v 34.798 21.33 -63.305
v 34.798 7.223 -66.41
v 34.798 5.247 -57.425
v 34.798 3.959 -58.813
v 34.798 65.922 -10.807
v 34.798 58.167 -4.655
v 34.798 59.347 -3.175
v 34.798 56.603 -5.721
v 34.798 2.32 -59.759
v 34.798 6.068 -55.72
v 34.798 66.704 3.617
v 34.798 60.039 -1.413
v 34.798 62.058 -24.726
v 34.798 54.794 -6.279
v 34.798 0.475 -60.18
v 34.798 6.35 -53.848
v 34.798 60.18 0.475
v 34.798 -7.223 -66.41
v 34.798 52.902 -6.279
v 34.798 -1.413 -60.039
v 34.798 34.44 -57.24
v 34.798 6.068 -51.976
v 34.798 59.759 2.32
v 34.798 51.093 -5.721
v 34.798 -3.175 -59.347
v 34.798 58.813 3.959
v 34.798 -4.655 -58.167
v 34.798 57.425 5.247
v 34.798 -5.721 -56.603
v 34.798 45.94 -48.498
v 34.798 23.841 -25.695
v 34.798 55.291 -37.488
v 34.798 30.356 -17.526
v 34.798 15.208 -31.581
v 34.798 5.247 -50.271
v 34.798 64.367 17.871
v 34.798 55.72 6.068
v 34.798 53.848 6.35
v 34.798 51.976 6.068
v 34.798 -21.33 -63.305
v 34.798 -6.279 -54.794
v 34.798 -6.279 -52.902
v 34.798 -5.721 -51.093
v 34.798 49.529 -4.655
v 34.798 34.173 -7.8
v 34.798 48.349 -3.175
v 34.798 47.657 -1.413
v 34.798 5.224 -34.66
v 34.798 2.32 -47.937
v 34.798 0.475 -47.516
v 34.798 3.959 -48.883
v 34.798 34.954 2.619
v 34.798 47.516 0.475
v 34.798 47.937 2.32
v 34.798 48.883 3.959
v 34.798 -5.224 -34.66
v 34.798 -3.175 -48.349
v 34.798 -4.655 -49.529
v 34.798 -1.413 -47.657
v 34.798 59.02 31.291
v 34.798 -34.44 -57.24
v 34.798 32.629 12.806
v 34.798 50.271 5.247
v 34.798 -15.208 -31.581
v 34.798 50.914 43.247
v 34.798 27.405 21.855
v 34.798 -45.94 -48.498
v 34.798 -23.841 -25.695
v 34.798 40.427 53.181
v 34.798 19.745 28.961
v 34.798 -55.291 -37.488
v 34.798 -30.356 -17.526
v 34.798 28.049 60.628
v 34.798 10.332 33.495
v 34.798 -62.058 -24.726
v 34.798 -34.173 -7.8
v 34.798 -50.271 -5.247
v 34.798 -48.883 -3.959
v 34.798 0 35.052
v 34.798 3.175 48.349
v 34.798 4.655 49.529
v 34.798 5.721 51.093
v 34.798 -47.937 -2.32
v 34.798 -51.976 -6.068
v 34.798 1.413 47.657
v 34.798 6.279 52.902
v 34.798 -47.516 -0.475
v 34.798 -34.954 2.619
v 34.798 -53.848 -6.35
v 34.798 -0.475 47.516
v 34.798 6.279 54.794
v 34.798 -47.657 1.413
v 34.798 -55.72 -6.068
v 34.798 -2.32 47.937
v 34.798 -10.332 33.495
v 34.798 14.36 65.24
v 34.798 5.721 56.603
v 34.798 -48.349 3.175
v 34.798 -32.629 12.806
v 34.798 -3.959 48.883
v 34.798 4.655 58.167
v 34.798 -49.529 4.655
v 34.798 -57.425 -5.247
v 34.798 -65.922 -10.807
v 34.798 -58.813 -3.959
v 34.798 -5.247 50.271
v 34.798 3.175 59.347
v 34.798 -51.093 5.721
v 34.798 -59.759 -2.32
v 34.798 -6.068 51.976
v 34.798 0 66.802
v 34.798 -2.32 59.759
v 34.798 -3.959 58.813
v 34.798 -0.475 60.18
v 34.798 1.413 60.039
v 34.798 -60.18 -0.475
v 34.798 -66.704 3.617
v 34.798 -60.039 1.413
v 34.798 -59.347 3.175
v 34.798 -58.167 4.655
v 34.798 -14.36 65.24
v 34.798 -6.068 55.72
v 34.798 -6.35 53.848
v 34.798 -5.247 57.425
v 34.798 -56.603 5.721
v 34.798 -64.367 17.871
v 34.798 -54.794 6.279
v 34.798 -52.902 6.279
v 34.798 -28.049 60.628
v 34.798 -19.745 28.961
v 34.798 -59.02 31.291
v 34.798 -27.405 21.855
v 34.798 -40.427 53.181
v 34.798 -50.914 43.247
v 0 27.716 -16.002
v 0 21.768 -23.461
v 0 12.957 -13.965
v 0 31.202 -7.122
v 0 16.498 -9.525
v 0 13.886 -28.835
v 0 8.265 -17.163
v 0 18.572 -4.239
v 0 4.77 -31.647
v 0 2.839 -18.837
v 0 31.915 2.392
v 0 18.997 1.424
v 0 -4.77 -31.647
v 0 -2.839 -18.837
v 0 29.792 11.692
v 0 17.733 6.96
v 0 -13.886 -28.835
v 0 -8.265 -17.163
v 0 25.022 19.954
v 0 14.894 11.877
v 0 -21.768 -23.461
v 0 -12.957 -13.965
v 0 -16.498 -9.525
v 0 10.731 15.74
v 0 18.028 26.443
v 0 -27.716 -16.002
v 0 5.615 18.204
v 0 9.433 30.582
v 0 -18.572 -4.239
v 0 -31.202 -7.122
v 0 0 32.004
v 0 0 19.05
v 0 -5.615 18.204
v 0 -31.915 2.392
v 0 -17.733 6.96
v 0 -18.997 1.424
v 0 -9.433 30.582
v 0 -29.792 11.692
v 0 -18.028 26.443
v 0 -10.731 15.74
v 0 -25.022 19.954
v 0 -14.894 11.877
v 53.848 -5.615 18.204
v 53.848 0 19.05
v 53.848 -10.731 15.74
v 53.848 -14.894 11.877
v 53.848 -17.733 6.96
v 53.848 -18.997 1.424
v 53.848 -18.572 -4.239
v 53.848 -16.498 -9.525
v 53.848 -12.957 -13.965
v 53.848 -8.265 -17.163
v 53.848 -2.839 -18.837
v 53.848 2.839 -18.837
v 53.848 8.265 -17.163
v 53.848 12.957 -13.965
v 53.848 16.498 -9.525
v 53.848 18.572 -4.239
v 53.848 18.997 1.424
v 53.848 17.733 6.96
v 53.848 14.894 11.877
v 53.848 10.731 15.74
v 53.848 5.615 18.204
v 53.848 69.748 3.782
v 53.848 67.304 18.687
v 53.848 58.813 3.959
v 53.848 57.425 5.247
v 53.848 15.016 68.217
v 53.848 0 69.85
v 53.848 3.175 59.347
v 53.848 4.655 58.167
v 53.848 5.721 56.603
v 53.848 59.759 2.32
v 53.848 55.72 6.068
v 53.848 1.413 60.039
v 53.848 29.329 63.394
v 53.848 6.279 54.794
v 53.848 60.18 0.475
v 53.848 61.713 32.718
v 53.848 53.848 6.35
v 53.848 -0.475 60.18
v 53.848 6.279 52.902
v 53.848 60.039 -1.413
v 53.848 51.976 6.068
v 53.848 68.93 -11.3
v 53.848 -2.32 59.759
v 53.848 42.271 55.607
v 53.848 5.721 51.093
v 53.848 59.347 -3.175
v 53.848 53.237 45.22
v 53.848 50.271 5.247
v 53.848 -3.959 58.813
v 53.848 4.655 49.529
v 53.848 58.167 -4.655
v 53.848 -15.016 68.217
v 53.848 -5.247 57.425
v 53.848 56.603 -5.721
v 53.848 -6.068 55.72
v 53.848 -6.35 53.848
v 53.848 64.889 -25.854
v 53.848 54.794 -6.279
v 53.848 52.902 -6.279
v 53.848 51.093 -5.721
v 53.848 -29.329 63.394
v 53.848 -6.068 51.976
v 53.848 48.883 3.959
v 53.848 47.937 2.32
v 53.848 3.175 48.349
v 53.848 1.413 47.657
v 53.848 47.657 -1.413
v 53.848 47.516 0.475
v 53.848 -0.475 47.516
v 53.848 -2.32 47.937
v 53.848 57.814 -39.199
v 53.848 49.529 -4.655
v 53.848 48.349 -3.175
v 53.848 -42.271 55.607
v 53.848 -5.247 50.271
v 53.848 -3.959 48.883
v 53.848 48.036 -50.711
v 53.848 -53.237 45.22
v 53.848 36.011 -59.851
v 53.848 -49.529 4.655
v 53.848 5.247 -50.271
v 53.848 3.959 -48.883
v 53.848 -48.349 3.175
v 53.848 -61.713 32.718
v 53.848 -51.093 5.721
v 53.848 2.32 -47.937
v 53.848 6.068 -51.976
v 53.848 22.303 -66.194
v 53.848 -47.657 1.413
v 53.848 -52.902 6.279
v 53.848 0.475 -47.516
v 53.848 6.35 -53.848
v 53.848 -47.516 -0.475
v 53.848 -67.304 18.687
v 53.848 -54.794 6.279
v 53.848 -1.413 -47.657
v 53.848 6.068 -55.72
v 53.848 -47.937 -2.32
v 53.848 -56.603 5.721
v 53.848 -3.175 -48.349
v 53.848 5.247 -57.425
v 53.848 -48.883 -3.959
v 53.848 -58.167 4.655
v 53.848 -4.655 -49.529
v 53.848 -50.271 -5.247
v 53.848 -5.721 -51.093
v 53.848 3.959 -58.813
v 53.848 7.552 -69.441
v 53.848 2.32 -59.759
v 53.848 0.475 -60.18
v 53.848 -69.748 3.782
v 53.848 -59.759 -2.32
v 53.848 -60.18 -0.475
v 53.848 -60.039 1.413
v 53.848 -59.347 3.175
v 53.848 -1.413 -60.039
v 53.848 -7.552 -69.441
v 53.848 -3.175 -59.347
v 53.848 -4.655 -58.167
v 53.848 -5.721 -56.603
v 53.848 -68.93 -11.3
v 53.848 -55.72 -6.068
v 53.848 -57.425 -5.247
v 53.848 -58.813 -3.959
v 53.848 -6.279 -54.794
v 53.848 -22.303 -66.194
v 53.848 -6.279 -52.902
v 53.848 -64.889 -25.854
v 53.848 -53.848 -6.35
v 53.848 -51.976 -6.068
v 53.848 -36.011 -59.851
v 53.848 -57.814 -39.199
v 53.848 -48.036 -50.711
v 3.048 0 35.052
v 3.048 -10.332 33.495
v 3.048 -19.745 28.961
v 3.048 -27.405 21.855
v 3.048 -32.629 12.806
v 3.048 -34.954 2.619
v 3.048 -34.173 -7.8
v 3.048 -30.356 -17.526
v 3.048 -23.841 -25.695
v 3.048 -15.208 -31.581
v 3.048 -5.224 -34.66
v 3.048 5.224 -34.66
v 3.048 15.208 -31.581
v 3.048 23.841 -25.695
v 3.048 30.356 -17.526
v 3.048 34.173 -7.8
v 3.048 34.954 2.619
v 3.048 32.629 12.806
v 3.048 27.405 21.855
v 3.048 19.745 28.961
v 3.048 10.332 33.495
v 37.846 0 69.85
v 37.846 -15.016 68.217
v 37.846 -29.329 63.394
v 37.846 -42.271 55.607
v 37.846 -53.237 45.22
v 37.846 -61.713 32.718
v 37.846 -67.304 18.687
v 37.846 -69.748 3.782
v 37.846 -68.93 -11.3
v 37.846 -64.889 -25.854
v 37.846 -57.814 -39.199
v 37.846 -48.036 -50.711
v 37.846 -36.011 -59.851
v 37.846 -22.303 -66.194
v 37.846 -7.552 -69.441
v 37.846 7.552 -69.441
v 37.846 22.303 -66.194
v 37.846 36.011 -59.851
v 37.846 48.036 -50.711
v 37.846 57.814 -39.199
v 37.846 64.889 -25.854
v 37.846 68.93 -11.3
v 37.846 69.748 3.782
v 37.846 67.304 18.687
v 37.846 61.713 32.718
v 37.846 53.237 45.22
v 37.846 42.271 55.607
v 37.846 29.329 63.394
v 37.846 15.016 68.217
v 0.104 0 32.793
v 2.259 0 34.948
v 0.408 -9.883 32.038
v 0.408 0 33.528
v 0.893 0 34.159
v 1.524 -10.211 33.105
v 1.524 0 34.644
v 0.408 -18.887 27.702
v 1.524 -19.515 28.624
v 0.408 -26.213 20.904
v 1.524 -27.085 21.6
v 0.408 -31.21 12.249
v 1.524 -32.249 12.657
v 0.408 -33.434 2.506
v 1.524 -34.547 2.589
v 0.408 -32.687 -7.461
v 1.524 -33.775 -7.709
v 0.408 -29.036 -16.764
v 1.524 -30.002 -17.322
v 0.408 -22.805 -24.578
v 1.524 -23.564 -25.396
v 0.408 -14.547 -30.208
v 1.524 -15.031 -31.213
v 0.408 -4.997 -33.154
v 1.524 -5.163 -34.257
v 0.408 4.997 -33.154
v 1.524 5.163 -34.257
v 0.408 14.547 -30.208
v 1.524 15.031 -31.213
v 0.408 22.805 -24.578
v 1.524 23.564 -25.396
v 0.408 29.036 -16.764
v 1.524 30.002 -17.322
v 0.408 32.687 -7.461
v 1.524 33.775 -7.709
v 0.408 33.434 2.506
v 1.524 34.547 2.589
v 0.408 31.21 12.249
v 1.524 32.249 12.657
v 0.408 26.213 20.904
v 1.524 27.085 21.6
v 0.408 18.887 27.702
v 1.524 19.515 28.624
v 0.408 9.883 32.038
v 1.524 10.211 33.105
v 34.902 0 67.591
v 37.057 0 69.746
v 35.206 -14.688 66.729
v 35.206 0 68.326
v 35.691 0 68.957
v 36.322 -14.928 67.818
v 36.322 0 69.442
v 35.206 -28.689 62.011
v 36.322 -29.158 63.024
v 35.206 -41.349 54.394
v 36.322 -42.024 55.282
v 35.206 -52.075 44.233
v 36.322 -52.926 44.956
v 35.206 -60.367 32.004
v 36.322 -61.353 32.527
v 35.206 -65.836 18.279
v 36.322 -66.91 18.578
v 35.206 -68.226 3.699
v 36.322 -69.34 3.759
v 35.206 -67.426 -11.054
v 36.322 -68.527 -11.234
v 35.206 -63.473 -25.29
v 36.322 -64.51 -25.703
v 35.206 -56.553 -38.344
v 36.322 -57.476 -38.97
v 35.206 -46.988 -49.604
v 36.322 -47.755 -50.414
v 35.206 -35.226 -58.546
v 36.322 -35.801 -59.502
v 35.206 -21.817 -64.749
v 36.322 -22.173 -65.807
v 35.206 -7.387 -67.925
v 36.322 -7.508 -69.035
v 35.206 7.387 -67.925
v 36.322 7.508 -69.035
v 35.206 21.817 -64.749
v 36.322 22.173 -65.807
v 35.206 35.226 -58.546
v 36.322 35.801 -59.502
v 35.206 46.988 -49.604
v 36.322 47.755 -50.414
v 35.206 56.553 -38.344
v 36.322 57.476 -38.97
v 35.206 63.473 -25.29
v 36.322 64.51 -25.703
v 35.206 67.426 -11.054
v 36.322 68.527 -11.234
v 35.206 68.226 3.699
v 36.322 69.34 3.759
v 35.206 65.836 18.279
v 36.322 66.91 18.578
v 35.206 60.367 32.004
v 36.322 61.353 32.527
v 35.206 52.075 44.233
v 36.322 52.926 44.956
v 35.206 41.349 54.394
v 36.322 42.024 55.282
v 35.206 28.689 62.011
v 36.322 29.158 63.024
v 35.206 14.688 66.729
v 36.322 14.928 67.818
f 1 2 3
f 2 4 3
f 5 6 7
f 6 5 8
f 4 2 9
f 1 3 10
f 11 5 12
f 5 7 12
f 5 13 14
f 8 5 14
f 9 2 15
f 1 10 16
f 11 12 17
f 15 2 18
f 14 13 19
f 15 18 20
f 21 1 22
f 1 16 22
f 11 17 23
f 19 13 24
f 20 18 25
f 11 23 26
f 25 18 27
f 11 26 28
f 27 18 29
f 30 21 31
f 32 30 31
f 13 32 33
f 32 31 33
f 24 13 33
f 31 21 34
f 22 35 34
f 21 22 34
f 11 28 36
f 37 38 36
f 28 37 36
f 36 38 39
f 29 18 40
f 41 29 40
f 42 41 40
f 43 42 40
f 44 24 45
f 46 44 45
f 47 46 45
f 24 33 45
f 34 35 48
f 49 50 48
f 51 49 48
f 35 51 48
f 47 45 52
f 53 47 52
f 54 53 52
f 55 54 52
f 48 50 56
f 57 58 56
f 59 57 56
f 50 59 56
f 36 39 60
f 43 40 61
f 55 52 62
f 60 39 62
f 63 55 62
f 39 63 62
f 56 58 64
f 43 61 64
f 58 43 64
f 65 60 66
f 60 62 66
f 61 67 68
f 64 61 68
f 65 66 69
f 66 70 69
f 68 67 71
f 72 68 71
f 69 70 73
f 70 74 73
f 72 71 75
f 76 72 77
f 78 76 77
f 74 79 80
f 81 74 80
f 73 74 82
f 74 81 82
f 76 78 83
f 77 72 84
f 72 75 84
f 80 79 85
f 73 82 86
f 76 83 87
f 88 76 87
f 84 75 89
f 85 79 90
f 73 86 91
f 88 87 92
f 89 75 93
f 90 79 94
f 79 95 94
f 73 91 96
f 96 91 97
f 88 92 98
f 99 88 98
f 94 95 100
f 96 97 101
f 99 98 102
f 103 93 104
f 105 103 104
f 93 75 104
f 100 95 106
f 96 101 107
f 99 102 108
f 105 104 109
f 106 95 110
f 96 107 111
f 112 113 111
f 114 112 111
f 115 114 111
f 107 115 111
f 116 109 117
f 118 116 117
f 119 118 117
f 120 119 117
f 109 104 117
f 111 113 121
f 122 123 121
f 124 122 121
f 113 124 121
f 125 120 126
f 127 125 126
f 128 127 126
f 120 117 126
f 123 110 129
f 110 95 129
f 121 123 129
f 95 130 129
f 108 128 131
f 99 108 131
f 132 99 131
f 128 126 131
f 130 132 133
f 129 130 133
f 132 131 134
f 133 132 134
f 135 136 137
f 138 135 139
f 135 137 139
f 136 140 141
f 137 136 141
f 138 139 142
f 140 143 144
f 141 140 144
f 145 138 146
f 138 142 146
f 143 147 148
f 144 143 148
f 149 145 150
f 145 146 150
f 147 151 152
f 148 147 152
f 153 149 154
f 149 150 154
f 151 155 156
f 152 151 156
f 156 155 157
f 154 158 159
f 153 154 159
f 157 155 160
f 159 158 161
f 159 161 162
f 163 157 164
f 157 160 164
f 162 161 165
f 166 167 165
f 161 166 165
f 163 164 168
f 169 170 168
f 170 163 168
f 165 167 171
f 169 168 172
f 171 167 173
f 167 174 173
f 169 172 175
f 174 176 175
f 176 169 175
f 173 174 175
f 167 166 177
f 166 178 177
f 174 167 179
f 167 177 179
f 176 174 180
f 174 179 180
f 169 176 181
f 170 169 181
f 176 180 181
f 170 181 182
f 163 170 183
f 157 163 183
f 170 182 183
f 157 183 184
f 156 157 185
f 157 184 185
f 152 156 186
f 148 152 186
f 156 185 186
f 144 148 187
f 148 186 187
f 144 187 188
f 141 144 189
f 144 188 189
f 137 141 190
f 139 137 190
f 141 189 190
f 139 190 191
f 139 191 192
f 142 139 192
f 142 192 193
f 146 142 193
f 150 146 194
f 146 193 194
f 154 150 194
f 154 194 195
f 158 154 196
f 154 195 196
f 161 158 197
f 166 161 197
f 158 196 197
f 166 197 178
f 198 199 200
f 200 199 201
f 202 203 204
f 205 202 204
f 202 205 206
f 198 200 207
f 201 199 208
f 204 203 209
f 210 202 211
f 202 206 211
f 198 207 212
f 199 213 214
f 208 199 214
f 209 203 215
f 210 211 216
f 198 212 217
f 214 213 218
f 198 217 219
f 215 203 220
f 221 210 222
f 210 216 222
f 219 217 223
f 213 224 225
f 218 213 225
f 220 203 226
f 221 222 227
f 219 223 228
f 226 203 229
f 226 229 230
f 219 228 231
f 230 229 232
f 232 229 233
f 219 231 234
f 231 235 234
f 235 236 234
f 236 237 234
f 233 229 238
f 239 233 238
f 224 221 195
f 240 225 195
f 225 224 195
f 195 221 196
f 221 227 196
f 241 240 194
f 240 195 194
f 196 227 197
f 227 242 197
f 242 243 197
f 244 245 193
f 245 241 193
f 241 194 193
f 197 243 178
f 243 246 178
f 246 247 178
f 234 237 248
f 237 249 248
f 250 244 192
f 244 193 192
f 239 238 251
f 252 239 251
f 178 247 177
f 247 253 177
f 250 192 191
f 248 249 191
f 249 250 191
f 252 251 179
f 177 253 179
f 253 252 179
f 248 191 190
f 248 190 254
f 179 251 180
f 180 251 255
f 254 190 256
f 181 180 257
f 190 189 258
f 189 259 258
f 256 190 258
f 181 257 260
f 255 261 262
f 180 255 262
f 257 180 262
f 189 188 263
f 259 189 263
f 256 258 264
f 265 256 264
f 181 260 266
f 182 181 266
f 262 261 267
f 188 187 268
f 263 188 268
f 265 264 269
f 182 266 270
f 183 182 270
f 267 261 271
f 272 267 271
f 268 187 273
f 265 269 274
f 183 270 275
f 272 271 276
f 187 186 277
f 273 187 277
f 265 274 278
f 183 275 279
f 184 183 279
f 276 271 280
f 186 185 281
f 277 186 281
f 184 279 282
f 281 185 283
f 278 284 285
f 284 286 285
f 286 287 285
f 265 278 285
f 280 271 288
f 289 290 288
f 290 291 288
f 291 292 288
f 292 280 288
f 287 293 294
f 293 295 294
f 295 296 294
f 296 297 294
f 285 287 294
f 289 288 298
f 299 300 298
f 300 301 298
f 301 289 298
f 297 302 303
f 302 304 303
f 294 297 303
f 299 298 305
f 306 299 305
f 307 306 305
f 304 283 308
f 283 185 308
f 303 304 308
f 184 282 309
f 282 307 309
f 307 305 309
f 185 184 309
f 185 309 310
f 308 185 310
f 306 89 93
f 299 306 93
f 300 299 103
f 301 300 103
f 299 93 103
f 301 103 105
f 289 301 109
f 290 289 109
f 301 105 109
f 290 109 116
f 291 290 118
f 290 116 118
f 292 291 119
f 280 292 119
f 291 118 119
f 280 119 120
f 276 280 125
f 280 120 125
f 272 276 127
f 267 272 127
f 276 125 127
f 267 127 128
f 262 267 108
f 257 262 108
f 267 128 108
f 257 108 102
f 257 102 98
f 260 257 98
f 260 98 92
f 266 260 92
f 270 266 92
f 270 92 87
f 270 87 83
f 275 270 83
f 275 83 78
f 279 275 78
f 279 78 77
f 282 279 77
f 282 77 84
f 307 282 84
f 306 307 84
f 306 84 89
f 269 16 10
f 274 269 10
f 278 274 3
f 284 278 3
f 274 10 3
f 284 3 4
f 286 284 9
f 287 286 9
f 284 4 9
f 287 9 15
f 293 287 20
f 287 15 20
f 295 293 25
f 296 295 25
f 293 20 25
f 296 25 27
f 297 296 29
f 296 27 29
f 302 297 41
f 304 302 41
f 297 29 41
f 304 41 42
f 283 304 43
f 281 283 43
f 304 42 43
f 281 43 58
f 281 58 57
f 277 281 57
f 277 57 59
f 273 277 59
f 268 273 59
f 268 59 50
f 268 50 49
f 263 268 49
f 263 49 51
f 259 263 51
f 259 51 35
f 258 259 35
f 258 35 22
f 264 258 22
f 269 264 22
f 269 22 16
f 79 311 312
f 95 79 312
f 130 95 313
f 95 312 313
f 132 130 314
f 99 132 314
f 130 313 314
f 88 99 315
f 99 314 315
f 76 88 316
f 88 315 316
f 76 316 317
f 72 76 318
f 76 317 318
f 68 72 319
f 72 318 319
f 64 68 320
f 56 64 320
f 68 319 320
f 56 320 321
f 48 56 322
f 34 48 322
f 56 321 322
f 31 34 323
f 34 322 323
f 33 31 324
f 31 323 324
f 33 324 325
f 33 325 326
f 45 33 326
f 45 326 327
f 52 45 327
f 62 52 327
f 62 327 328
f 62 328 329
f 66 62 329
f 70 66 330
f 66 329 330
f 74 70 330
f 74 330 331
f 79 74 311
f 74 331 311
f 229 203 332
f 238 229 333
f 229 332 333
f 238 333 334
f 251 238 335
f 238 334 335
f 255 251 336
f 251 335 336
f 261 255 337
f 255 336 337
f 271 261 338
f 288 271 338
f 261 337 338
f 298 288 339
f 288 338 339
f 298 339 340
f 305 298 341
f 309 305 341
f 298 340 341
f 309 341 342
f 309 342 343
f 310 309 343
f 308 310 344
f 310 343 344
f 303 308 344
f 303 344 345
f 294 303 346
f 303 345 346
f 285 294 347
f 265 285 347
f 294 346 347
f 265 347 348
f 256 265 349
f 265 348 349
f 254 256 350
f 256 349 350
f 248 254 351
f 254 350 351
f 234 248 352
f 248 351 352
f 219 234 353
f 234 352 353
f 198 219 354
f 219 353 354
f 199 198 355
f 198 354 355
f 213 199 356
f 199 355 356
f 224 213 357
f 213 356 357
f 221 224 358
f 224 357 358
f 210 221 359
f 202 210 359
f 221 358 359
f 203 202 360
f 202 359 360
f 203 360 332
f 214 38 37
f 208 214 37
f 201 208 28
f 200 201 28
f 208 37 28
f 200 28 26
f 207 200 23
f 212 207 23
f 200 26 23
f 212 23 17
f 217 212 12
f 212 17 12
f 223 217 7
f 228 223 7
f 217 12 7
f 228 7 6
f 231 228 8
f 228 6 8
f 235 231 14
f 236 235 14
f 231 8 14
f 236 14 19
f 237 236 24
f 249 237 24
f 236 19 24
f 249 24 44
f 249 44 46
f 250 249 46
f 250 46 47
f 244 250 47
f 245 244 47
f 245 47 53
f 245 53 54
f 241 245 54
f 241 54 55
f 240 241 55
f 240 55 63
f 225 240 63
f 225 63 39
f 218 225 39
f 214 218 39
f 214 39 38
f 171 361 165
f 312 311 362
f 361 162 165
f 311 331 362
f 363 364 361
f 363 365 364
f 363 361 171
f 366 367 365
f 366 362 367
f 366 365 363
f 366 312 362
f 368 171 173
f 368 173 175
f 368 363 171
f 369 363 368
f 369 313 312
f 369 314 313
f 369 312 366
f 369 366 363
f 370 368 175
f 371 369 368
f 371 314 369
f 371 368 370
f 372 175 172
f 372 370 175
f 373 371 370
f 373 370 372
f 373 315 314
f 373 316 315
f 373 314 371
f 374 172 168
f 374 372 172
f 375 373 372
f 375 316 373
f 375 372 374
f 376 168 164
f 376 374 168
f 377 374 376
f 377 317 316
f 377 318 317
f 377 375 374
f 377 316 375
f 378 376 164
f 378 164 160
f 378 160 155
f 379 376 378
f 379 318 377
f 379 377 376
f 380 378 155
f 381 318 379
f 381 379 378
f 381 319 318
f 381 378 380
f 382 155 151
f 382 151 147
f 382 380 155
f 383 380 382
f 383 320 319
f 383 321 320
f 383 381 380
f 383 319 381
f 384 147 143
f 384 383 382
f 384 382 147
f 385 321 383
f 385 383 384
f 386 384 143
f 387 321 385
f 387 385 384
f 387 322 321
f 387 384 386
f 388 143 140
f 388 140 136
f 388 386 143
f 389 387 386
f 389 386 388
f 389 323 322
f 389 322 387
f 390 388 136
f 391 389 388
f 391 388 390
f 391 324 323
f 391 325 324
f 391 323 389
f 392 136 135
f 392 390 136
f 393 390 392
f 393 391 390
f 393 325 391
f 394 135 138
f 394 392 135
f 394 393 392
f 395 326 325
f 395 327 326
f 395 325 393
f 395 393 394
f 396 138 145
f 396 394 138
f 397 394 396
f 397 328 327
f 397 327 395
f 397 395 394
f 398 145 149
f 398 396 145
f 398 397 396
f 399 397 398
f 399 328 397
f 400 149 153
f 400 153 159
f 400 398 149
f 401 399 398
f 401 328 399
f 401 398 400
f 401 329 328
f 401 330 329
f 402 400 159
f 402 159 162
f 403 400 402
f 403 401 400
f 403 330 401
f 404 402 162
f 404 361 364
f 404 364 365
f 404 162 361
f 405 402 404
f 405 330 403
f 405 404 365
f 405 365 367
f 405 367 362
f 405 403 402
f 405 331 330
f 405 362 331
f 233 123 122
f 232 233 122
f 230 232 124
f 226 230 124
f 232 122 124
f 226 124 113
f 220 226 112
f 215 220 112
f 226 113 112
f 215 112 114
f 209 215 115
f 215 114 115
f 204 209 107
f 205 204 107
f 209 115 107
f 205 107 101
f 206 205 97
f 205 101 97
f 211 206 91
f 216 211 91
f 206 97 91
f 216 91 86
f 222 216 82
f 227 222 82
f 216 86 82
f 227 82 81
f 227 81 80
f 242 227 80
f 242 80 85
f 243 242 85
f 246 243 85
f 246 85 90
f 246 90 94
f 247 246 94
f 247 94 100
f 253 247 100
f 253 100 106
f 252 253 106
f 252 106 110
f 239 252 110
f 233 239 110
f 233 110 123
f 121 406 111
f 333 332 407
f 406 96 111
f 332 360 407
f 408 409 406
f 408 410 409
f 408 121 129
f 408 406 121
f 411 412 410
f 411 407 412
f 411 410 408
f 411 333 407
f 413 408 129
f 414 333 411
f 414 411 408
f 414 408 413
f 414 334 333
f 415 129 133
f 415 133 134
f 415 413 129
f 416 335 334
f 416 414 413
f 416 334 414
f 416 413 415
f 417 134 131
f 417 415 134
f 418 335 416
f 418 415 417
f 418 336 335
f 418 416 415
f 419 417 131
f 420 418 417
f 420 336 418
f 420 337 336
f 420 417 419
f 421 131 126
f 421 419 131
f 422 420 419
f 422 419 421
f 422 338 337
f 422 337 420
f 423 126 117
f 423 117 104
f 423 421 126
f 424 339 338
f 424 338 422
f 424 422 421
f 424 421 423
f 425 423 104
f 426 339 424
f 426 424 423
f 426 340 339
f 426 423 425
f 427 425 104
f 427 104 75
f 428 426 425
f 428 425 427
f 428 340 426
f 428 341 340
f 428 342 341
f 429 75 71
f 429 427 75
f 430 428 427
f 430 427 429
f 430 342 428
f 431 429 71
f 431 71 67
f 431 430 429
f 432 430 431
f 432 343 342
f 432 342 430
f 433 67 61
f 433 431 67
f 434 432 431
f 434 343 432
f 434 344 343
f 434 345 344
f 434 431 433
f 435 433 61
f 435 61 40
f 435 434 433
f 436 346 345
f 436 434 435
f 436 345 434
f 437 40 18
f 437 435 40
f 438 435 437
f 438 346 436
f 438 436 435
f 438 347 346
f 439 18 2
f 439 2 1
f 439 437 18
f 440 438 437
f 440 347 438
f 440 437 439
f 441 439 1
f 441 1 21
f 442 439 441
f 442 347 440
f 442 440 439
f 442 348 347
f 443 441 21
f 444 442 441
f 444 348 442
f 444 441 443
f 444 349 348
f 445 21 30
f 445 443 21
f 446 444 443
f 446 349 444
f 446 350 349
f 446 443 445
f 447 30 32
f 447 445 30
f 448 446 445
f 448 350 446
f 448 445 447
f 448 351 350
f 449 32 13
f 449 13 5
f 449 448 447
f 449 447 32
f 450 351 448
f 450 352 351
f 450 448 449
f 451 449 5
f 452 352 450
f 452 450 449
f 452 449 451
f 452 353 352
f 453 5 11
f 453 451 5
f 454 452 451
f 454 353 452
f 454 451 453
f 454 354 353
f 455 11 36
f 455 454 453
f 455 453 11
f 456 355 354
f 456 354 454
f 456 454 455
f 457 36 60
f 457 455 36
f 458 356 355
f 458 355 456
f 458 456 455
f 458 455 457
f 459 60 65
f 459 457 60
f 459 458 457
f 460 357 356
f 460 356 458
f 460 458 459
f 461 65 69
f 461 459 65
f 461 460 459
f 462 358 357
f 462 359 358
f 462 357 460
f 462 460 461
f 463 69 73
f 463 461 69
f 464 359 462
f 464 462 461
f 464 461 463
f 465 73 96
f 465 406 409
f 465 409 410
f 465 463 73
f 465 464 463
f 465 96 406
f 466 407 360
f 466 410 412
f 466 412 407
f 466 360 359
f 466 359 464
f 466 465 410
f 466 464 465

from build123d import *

# Parameters (mm, degrees)
F2_R            = 6.35
F3_DEPTH        = 19.051
F3_COPIES_COUNT = 4
F4_R            = 3.048


# Not quite as in the source:
# - a pattern or mirror of a feature is missing from the dataset's text; its kind, count and spacing are read off the source's solid


with BuildPart() as f1:
    # F0 (on Front) → F1 (revolve)
    with BuildSketch(Plane.XZ):
        Polygon((0, 35.052), (0, 19.05), (53.848, 19.05), (53.848, 69.85), (34.798, 69.85), (34.798, 35.052), align=None)
    revolve(axis=Axis((26.924, 0, 0), (1, 0, 0)))

    # F2 (on face) → F3 (cut, through all)
    with BuildSketch(Plane(origin=(34.798, 0, 0), x_dir=(0, -1, 0), z_dir=(-1, 0, 0))):
        with Locations((0, 53.848)):
            Circle(F2_R)
    f3 = extrude(amount=-F3_DEPTH, mode=Mode.SUBTRACT)

    # F3_copies: F3 ×4 about axis
    f3_copies_axis = Axis((0, 0, 0), (1, 0, 0))
    for i in range(1, F3_COPIES_COUNT):
        add(f3.rotate(f3_copies_axis, i * 360 / F3_COPIES_COUNT), mode=Mode.SUBTRACT)

    # F4
    f4_edges = [f1.edges().sort_by_distance(p)[0] for p in [
        (0, 0, -35.052),
        (34.798, 0, -69.85),
    ]]
    fillet(f4_edges, radius=F4_R)


solid = f1.part
